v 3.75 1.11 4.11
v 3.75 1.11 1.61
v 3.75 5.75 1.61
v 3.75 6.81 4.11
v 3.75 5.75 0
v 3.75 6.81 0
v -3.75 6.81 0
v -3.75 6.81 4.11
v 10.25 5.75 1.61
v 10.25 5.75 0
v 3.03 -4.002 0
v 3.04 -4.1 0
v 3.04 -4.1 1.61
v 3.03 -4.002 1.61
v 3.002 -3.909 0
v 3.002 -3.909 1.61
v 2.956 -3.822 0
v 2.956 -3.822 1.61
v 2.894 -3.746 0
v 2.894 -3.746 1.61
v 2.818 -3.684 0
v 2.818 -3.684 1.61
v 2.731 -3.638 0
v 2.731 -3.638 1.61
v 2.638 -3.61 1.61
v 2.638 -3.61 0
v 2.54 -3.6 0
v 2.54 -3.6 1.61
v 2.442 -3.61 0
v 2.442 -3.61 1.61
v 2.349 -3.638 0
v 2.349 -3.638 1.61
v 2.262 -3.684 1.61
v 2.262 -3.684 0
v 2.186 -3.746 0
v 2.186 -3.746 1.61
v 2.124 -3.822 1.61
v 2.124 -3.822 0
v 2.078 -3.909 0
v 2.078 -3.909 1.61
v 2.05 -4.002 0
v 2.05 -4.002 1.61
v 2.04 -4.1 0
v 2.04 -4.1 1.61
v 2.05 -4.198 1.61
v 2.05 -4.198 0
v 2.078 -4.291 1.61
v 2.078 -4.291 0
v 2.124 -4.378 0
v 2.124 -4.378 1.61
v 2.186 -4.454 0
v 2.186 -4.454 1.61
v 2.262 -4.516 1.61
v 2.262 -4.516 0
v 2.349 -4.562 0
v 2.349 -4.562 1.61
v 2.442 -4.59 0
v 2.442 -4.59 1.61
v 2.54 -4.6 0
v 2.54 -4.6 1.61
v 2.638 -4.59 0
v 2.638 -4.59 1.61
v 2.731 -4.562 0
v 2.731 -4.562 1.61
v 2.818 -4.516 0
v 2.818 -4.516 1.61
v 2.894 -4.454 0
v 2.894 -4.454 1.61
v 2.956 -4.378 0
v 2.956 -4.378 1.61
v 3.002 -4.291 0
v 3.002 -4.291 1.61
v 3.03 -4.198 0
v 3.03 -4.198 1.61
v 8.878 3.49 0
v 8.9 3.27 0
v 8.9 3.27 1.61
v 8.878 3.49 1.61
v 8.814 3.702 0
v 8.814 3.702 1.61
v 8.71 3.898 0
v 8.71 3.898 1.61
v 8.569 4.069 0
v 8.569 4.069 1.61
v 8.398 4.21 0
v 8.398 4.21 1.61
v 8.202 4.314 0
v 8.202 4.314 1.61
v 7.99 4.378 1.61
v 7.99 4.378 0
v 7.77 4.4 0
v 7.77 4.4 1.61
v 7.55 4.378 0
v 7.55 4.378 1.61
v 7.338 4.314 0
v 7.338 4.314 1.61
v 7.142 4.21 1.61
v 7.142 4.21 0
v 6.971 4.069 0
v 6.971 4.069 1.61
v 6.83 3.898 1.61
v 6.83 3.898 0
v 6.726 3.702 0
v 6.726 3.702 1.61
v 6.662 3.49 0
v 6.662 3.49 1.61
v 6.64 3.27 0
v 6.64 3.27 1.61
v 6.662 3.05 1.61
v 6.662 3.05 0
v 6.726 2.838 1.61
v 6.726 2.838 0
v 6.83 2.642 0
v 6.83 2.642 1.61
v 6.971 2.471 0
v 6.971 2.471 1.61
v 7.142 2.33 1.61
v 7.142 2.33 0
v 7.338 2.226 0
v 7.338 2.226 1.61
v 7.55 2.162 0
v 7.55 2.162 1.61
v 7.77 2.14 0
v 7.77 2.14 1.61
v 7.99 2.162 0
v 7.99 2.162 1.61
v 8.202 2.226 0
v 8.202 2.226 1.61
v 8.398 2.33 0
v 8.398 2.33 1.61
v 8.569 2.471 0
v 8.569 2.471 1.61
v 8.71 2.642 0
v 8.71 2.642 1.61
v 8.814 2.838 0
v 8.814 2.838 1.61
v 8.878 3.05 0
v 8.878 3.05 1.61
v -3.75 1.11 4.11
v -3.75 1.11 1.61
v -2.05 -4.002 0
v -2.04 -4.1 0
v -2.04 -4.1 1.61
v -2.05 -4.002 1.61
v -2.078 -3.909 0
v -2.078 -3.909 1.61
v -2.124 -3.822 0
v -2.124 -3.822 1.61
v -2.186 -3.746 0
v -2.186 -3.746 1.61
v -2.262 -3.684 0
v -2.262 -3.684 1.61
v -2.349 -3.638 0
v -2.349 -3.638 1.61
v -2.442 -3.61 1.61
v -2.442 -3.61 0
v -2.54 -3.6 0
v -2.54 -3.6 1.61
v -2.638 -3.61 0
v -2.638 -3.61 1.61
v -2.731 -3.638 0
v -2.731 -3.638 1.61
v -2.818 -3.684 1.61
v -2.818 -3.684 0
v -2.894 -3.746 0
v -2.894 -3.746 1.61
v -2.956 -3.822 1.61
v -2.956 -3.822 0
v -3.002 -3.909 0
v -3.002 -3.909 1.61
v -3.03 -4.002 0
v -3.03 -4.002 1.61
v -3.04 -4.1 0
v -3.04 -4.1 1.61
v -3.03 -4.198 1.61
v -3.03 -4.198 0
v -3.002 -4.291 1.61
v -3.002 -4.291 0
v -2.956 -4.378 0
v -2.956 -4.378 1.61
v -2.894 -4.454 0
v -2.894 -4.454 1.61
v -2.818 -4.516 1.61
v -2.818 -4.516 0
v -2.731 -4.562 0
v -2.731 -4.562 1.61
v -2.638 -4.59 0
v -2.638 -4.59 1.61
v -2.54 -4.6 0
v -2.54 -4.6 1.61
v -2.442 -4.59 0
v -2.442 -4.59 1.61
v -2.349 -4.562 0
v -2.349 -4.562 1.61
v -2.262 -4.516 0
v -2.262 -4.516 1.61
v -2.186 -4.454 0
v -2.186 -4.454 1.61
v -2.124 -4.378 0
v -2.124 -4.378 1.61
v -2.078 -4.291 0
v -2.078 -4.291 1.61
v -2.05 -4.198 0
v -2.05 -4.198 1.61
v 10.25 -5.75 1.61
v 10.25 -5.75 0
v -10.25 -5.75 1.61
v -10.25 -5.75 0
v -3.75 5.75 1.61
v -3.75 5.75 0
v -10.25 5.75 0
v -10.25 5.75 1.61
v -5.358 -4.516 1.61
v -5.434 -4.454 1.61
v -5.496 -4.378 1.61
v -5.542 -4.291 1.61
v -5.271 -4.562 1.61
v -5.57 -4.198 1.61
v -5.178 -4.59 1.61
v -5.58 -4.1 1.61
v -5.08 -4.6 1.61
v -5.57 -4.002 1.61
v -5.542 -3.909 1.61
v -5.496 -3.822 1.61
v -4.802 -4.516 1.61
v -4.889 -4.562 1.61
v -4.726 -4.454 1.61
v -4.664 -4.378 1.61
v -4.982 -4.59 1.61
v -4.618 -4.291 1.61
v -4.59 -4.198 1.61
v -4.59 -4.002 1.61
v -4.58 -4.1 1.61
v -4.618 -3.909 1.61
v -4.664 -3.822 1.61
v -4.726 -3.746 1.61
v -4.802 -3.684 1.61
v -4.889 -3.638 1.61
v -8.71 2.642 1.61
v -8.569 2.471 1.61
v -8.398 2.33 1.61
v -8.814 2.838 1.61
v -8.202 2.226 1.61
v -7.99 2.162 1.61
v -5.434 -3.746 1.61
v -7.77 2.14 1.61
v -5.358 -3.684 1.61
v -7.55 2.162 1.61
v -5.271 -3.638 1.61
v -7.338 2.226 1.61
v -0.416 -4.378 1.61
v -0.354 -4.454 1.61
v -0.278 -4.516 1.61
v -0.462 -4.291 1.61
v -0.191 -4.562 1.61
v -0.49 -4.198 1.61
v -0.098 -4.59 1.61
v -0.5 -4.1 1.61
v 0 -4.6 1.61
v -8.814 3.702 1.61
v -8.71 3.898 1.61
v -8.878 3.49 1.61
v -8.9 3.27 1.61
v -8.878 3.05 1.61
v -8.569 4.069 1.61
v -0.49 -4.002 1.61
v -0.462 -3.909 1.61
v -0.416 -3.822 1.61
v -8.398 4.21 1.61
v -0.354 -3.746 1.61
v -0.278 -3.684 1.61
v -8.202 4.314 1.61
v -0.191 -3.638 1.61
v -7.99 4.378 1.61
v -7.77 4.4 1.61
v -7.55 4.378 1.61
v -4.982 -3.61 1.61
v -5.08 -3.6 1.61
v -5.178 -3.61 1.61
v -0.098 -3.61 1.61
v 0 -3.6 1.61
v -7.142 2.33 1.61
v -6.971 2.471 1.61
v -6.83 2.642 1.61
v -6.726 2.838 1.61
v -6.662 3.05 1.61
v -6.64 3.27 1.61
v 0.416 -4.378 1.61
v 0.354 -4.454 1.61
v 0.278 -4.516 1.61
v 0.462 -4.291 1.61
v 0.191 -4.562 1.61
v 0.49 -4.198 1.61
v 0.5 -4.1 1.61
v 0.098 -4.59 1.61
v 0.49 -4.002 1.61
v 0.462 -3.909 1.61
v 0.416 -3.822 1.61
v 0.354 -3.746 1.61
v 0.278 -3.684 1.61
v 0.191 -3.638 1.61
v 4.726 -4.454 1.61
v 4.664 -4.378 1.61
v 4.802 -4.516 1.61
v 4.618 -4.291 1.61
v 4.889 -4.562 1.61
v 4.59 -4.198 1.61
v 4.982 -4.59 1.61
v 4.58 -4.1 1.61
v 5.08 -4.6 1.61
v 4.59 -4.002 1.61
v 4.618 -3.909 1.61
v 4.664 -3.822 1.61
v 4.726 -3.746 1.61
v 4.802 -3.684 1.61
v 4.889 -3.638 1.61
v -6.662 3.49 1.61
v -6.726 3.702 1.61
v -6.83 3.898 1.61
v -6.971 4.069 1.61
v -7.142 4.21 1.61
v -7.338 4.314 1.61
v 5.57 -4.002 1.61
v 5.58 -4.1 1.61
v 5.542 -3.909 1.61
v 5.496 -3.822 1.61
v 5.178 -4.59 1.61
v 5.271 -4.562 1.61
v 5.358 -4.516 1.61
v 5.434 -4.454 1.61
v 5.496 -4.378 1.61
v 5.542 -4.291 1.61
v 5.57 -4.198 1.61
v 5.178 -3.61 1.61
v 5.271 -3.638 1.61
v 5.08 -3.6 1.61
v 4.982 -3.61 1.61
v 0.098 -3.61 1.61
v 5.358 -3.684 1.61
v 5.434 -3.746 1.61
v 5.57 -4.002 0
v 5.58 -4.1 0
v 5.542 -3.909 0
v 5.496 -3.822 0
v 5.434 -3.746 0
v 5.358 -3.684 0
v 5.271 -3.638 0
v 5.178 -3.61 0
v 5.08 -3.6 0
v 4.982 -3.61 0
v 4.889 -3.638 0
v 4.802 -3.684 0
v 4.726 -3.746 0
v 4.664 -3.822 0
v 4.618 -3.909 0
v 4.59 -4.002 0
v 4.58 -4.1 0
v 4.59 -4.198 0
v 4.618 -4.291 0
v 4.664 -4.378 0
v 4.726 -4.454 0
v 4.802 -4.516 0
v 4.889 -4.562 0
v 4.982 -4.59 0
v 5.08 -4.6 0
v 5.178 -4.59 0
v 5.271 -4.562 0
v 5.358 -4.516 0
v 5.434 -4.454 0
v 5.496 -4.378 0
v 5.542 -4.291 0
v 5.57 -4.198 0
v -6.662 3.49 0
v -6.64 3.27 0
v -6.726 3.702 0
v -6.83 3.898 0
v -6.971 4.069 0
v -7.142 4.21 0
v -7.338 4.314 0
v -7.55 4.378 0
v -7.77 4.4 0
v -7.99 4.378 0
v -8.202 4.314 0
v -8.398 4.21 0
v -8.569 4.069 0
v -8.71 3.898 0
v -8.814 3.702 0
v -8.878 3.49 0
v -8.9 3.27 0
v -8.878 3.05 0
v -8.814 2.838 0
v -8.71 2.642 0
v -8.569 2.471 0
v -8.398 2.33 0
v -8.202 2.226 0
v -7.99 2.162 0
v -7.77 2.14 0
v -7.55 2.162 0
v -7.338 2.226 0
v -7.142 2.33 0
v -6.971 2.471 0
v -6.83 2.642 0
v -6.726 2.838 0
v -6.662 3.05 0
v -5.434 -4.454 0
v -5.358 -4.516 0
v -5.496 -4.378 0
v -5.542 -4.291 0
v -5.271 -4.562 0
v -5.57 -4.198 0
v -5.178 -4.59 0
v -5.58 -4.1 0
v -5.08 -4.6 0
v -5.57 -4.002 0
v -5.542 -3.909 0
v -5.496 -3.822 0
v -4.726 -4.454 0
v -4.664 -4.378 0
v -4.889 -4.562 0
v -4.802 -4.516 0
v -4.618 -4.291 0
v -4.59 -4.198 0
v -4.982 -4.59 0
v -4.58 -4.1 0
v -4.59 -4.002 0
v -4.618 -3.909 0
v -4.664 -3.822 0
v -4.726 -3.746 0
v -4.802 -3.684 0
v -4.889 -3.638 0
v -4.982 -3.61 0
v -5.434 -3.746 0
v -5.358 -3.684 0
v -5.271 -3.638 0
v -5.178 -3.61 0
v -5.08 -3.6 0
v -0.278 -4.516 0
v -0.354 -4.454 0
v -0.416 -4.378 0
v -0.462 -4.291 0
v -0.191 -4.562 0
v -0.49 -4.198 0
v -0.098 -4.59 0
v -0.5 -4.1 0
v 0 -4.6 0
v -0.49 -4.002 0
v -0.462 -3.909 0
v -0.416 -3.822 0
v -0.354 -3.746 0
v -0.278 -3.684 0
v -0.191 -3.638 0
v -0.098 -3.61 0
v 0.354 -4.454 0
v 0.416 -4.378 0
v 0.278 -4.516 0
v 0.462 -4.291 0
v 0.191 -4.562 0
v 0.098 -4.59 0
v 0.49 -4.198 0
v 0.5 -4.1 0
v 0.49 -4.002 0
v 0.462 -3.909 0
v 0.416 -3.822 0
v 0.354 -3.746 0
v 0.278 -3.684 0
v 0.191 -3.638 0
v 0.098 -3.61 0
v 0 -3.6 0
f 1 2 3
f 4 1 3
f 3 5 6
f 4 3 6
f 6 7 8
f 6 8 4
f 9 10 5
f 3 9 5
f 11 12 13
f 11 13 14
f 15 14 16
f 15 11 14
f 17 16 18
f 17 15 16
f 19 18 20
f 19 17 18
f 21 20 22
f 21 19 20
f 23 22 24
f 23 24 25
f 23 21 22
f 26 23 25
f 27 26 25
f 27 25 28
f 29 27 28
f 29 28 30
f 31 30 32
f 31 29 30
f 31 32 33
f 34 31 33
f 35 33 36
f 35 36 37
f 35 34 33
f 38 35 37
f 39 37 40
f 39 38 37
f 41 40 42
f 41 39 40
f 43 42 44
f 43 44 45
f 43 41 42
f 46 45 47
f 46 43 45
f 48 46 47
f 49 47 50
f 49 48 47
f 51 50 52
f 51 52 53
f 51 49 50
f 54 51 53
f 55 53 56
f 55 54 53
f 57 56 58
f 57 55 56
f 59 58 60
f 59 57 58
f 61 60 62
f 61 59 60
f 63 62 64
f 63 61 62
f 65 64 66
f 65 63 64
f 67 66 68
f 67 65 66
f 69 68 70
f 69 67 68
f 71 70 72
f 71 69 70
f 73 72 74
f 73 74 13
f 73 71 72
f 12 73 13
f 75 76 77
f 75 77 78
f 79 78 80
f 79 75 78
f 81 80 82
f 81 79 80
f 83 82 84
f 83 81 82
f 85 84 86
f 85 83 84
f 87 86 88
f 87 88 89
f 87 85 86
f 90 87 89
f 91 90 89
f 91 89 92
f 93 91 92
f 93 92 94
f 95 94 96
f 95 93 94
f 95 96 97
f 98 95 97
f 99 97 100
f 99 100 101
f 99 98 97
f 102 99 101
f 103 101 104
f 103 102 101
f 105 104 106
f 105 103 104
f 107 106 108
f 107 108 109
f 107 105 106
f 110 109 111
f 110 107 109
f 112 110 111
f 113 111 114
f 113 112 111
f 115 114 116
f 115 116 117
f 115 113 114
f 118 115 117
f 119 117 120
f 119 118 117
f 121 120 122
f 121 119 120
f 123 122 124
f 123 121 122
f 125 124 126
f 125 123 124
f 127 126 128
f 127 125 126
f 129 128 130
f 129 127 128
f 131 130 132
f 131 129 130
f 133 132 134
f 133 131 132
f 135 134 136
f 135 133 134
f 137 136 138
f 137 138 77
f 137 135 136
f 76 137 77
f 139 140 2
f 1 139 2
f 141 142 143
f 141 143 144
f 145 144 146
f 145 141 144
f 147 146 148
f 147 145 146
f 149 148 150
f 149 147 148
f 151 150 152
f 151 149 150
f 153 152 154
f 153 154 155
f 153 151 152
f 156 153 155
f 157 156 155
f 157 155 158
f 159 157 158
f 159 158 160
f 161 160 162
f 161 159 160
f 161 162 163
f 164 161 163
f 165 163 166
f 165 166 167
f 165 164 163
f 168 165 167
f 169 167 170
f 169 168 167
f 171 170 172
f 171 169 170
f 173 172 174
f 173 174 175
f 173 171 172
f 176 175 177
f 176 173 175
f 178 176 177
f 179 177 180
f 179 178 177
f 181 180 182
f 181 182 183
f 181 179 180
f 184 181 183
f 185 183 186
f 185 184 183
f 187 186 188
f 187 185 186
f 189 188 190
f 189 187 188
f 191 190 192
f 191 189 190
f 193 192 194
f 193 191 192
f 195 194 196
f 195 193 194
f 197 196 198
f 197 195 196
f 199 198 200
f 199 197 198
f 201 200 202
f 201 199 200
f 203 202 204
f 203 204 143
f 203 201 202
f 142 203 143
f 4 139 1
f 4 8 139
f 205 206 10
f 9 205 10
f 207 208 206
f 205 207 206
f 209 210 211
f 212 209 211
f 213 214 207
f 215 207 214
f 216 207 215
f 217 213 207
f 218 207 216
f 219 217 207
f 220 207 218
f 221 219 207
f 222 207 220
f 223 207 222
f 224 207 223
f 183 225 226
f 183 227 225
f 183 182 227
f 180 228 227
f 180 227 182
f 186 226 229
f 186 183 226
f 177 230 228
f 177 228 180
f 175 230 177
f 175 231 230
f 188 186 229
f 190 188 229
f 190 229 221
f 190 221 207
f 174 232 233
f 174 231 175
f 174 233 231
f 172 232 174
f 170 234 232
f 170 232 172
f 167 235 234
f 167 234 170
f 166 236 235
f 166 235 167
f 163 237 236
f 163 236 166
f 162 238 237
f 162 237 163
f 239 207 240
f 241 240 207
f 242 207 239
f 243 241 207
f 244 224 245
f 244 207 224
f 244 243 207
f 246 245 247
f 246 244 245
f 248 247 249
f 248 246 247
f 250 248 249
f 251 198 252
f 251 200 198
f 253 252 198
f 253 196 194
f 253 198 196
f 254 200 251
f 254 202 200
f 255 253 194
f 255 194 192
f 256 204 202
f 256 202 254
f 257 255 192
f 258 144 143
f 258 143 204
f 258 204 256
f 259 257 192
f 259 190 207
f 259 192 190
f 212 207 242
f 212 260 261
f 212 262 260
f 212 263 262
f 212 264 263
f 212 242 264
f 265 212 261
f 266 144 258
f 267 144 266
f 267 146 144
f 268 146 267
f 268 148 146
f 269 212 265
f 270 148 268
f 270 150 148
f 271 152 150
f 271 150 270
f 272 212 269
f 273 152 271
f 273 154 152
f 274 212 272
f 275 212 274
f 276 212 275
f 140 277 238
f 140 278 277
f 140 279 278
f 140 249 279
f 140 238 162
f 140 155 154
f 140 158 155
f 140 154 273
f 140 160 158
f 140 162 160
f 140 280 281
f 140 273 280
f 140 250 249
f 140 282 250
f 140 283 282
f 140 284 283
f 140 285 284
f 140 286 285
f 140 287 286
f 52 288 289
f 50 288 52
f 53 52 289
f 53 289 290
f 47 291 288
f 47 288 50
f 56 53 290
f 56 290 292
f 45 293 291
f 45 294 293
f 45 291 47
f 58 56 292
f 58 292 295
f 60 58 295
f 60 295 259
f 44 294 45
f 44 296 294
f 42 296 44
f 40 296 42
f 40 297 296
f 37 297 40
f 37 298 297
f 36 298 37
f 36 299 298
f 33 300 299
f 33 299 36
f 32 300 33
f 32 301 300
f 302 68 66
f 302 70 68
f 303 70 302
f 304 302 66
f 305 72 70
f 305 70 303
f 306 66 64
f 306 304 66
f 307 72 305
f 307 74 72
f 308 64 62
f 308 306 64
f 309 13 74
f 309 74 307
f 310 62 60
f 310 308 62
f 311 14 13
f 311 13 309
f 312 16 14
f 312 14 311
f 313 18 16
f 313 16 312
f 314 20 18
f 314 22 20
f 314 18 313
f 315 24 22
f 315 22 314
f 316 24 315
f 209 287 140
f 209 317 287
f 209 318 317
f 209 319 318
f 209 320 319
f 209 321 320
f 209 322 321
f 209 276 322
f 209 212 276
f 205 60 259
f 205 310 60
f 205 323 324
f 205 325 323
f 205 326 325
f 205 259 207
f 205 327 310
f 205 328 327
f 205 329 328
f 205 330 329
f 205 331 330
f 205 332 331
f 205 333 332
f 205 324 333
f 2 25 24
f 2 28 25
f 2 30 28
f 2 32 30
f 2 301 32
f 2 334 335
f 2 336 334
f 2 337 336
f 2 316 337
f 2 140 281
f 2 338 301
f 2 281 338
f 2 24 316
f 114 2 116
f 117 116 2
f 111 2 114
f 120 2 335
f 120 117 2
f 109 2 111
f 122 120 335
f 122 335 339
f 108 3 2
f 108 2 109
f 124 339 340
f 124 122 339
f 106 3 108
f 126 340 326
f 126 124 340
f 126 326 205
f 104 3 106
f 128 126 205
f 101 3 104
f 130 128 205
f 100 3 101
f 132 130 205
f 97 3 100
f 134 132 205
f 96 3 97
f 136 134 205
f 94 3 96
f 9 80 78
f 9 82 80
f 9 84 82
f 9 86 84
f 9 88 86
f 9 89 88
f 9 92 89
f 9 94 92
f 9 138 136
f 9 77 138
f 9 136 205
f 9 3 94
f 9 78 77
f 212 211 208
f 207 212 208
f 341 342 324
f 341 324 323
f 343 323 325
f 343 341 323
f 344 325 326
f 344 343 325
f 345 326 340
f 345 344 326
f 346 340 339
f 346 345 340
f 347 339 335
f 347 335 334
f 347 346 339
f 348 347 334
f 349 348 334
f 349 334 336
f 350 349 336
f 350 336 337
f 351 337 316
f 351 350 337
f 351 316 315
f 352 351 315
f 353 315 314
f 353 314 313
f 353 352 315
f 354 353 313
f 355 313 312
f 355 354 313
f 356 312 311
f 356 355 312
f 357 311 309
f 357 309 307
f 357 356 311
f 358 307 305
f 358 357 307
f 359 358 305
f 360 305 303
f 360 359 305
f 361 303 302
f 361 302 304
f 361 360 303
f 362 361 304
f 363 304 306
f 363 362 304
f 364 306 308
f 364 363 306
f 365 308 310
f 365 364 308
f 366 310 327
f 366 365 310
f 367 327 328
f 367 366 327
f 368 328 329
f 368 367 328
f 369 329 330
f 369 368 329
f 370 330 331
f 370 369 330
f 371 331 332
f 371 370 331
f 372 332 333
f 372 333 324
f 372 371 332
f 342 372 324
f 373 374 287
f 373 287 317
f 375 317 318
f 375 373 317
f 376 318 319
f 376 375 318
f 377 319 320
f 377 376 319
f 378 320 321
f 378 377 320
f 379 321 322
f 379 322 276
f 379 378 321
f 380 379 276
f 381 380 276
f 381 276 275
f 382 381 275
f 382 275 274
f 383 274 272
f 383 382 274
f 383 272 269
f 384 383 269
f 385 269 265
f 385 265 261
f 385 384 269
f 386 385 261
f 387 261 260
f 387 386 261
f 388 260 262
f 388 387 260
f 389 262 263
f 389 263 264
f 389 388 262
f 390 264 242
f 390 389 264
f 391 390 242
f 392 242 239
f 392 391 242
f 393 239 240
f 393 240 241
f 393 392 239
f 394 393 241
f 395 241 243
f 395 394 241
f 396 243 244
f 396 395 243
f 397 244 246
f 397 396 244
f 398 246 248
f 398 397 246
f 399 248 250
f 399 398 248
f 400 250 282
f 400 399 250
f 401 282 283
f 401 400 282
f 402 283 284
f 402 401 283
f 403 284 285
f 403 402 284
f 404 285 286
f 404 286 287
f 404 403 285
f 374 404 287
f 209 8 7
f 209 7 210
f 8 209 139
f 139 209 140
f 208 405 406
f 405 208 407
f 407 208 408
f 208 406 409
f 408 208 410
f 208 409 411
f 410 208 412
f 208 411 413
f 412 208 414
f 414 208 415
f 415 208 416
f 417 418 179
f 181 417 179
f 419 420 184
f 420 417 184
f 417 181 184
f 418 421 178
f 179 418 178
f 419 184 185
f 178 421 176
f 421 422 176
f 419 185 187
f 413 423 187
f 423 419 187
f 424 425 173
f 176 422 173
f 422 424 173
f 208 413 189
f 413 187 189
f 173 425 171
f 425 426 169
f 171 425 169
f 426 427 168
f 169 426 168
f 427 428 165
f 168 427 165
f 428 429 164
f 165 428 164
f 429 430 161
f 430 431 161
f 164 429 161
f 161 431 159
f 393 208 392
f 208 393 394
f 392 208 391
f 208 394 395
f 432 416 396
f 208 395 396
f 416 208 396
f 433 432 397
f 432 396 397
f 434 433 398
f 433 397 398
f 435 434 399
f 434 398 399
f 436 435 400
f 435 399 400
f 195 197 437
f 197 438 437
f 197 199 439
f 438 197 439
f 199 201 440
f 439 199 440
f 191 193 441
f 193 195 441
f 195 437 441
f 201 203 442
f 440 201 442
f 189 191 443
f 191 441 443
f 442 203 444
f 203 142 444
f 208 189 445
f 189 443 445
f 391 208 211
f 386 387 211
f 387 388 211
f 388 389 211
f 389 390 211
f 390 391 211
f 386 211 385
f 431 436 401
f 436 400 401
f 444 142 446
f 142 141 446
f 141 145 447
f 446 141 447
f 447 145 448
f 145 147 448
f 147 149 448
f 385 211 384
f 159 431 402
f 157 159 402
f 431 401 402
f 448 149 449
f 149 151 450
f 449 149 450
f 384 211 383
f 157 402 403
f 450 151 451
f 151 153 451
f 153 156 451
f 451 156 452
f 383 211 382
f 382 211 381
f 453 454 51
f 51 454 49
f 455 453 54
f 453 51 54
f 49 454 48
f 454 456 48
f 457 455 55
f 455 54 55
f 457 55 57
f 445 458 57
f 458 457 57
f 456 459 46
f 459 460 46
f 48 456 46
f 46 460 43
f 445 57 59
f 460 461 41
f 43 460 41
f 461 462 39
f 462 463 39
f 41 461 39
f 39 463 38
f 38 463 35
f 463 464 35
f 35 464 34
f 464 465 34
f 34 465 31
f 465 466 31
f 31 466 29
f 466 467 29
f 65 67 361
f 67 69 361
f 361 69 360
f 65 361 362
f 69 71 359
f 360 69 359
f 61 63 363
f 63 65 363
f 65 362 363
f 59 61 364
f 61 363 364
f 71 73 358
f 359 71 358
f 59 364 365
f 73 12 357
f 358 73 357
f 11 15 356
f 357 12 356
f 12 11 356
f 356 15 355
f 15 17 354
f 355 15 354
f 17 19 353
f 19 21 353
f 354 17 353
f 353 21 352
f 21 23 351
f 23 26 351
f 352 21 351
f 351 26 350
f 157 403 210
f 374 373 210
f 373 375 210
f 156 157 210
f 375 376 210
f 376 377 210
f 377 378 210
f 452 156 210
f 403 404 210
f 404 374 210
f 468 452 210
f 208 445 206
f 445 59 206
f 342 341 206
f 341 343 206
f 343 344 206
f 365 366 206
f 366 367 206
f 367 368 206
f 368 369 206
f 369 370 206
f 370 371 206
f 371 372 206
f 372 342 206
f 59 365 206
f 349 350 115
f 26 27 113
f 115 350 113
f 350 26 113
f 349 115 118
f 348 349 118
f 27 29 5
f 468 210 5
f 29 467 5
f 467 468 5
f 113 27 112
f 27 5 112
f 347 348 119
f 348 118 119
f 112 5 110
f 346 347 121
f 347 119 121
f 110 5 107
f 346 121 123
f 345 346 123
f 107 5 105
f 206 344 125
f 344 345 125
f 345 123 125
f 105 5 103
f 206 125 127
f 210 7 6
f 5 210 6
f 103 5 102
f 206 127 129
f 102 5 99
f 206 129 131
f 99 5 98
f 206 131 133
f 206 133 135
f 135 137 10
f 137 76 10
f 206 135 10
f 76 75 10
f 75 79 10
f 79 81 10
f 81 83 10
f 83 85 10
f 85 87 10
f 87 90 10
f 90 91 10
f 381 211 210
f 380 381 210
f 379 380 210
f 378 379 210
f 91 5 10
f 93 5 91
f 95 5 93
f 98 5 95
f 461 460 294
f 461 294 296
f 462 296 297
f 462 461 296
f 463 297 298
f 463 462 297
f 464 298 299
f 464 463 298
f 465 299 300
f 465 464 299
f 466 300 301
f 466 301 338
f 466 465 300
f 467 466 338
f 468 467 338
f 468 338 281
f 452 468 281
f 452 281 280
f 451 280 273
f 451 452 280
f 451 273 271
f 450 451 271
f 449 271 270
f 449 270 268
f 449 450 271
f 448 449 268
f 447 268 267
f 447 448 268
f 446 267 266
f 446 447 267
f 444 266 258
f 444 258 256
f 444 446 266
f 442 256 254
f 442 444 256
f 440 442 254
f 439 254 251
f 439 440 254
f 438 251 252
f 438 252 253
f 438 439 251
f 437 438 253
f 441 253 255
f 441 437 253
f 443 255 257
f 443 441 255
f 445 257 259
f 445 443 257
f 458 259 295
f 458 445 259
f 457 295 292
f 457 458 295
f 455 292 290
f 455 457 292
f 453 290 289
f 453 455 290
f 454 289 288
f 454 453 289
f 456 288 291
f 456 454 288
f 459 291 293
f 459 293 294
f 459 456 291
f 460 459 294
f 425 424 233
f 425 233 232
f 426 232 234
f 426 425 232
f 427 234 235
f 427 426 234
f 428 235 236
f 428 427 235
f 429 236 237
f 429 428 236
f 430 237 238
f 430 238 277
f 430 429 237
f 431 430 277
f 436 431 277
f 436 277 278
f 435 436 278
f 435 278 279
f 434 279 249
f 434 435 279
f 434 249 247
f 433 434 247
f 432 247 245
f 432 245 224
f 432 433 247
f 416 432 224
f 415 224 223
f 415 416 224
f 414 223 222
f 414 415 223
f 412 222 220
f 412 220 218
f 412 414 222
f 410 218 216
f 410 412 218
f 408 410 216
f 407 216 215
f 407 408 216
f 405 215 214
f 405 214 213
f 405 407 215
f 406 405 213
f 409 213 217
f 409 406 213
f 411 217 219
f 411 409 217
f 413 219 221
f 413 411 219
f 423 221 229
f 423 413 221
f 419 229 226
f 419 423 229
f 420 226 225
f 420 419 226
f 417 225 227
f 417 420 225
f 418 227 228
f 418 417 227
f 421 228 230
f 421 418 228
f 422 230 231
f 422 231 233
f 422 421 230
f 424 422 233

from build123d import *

# Parameters (mm, degrees)
F0_R     = 0.5
F0_R_2   = 1.13
F1_DEPTH = 1.61
F0_W     = 7.5
F0_H     = 4.64
F0_H_2   = 1.06
F2_DEPTH = 4.11


with BuildPart() as f1:
    # F0 (on Top) → F1 (new body)
    with BuildSketch(Plane.XY):
        Polygon((-10.25, -5.75), (10.25, -5.75), (10.25, 5.75), (3.75, 5.75), (3.75, 1.11), (-3.75, 1.11), (-3.75, 5.75), (-10.25, 5.75), align=None)
        with Locations((-5.08, -4.1)):
            Circle(F0_R, mode=Mode.SUBTRACT)
        with Locations((-2.54, -4.1)):
            Circle(F0_R, mode=Mode.SUBTRACT)
        with Locations((0, -4.1)):
            Circle(F0_R, mode=Mode.SUBTRACT)
        with Locations((2.54, -4.1)):
            Circle(F0_R, mode=Mode.SUBTRACT)
        with Locations((5.08, -4.1)):
            Circle(F0_R, mode=Mode.SUBTRACT)
        with Locations((-7.77, 3.27)):
            Circle(F0_R_2, mode=Mode.SUBTRACT)
        with Locations((7.77, 3.27)):
            Circle(F0_R_2, mode=Mode.SUBTRACT)
    extrude(amount=F1_DEPTH)

    # F0 (on Top) → F2 (join)
    with BuildSketch(Plane.XY):
        with Locations((0, 3.43)):
            Rectangle(F0_W, F0_H)
        with Locations((0, 6.28)):
            Rectangle(F0_W, F0_H_2)
    extrude(amount=F2_DEPTH)


solid = f1.part
